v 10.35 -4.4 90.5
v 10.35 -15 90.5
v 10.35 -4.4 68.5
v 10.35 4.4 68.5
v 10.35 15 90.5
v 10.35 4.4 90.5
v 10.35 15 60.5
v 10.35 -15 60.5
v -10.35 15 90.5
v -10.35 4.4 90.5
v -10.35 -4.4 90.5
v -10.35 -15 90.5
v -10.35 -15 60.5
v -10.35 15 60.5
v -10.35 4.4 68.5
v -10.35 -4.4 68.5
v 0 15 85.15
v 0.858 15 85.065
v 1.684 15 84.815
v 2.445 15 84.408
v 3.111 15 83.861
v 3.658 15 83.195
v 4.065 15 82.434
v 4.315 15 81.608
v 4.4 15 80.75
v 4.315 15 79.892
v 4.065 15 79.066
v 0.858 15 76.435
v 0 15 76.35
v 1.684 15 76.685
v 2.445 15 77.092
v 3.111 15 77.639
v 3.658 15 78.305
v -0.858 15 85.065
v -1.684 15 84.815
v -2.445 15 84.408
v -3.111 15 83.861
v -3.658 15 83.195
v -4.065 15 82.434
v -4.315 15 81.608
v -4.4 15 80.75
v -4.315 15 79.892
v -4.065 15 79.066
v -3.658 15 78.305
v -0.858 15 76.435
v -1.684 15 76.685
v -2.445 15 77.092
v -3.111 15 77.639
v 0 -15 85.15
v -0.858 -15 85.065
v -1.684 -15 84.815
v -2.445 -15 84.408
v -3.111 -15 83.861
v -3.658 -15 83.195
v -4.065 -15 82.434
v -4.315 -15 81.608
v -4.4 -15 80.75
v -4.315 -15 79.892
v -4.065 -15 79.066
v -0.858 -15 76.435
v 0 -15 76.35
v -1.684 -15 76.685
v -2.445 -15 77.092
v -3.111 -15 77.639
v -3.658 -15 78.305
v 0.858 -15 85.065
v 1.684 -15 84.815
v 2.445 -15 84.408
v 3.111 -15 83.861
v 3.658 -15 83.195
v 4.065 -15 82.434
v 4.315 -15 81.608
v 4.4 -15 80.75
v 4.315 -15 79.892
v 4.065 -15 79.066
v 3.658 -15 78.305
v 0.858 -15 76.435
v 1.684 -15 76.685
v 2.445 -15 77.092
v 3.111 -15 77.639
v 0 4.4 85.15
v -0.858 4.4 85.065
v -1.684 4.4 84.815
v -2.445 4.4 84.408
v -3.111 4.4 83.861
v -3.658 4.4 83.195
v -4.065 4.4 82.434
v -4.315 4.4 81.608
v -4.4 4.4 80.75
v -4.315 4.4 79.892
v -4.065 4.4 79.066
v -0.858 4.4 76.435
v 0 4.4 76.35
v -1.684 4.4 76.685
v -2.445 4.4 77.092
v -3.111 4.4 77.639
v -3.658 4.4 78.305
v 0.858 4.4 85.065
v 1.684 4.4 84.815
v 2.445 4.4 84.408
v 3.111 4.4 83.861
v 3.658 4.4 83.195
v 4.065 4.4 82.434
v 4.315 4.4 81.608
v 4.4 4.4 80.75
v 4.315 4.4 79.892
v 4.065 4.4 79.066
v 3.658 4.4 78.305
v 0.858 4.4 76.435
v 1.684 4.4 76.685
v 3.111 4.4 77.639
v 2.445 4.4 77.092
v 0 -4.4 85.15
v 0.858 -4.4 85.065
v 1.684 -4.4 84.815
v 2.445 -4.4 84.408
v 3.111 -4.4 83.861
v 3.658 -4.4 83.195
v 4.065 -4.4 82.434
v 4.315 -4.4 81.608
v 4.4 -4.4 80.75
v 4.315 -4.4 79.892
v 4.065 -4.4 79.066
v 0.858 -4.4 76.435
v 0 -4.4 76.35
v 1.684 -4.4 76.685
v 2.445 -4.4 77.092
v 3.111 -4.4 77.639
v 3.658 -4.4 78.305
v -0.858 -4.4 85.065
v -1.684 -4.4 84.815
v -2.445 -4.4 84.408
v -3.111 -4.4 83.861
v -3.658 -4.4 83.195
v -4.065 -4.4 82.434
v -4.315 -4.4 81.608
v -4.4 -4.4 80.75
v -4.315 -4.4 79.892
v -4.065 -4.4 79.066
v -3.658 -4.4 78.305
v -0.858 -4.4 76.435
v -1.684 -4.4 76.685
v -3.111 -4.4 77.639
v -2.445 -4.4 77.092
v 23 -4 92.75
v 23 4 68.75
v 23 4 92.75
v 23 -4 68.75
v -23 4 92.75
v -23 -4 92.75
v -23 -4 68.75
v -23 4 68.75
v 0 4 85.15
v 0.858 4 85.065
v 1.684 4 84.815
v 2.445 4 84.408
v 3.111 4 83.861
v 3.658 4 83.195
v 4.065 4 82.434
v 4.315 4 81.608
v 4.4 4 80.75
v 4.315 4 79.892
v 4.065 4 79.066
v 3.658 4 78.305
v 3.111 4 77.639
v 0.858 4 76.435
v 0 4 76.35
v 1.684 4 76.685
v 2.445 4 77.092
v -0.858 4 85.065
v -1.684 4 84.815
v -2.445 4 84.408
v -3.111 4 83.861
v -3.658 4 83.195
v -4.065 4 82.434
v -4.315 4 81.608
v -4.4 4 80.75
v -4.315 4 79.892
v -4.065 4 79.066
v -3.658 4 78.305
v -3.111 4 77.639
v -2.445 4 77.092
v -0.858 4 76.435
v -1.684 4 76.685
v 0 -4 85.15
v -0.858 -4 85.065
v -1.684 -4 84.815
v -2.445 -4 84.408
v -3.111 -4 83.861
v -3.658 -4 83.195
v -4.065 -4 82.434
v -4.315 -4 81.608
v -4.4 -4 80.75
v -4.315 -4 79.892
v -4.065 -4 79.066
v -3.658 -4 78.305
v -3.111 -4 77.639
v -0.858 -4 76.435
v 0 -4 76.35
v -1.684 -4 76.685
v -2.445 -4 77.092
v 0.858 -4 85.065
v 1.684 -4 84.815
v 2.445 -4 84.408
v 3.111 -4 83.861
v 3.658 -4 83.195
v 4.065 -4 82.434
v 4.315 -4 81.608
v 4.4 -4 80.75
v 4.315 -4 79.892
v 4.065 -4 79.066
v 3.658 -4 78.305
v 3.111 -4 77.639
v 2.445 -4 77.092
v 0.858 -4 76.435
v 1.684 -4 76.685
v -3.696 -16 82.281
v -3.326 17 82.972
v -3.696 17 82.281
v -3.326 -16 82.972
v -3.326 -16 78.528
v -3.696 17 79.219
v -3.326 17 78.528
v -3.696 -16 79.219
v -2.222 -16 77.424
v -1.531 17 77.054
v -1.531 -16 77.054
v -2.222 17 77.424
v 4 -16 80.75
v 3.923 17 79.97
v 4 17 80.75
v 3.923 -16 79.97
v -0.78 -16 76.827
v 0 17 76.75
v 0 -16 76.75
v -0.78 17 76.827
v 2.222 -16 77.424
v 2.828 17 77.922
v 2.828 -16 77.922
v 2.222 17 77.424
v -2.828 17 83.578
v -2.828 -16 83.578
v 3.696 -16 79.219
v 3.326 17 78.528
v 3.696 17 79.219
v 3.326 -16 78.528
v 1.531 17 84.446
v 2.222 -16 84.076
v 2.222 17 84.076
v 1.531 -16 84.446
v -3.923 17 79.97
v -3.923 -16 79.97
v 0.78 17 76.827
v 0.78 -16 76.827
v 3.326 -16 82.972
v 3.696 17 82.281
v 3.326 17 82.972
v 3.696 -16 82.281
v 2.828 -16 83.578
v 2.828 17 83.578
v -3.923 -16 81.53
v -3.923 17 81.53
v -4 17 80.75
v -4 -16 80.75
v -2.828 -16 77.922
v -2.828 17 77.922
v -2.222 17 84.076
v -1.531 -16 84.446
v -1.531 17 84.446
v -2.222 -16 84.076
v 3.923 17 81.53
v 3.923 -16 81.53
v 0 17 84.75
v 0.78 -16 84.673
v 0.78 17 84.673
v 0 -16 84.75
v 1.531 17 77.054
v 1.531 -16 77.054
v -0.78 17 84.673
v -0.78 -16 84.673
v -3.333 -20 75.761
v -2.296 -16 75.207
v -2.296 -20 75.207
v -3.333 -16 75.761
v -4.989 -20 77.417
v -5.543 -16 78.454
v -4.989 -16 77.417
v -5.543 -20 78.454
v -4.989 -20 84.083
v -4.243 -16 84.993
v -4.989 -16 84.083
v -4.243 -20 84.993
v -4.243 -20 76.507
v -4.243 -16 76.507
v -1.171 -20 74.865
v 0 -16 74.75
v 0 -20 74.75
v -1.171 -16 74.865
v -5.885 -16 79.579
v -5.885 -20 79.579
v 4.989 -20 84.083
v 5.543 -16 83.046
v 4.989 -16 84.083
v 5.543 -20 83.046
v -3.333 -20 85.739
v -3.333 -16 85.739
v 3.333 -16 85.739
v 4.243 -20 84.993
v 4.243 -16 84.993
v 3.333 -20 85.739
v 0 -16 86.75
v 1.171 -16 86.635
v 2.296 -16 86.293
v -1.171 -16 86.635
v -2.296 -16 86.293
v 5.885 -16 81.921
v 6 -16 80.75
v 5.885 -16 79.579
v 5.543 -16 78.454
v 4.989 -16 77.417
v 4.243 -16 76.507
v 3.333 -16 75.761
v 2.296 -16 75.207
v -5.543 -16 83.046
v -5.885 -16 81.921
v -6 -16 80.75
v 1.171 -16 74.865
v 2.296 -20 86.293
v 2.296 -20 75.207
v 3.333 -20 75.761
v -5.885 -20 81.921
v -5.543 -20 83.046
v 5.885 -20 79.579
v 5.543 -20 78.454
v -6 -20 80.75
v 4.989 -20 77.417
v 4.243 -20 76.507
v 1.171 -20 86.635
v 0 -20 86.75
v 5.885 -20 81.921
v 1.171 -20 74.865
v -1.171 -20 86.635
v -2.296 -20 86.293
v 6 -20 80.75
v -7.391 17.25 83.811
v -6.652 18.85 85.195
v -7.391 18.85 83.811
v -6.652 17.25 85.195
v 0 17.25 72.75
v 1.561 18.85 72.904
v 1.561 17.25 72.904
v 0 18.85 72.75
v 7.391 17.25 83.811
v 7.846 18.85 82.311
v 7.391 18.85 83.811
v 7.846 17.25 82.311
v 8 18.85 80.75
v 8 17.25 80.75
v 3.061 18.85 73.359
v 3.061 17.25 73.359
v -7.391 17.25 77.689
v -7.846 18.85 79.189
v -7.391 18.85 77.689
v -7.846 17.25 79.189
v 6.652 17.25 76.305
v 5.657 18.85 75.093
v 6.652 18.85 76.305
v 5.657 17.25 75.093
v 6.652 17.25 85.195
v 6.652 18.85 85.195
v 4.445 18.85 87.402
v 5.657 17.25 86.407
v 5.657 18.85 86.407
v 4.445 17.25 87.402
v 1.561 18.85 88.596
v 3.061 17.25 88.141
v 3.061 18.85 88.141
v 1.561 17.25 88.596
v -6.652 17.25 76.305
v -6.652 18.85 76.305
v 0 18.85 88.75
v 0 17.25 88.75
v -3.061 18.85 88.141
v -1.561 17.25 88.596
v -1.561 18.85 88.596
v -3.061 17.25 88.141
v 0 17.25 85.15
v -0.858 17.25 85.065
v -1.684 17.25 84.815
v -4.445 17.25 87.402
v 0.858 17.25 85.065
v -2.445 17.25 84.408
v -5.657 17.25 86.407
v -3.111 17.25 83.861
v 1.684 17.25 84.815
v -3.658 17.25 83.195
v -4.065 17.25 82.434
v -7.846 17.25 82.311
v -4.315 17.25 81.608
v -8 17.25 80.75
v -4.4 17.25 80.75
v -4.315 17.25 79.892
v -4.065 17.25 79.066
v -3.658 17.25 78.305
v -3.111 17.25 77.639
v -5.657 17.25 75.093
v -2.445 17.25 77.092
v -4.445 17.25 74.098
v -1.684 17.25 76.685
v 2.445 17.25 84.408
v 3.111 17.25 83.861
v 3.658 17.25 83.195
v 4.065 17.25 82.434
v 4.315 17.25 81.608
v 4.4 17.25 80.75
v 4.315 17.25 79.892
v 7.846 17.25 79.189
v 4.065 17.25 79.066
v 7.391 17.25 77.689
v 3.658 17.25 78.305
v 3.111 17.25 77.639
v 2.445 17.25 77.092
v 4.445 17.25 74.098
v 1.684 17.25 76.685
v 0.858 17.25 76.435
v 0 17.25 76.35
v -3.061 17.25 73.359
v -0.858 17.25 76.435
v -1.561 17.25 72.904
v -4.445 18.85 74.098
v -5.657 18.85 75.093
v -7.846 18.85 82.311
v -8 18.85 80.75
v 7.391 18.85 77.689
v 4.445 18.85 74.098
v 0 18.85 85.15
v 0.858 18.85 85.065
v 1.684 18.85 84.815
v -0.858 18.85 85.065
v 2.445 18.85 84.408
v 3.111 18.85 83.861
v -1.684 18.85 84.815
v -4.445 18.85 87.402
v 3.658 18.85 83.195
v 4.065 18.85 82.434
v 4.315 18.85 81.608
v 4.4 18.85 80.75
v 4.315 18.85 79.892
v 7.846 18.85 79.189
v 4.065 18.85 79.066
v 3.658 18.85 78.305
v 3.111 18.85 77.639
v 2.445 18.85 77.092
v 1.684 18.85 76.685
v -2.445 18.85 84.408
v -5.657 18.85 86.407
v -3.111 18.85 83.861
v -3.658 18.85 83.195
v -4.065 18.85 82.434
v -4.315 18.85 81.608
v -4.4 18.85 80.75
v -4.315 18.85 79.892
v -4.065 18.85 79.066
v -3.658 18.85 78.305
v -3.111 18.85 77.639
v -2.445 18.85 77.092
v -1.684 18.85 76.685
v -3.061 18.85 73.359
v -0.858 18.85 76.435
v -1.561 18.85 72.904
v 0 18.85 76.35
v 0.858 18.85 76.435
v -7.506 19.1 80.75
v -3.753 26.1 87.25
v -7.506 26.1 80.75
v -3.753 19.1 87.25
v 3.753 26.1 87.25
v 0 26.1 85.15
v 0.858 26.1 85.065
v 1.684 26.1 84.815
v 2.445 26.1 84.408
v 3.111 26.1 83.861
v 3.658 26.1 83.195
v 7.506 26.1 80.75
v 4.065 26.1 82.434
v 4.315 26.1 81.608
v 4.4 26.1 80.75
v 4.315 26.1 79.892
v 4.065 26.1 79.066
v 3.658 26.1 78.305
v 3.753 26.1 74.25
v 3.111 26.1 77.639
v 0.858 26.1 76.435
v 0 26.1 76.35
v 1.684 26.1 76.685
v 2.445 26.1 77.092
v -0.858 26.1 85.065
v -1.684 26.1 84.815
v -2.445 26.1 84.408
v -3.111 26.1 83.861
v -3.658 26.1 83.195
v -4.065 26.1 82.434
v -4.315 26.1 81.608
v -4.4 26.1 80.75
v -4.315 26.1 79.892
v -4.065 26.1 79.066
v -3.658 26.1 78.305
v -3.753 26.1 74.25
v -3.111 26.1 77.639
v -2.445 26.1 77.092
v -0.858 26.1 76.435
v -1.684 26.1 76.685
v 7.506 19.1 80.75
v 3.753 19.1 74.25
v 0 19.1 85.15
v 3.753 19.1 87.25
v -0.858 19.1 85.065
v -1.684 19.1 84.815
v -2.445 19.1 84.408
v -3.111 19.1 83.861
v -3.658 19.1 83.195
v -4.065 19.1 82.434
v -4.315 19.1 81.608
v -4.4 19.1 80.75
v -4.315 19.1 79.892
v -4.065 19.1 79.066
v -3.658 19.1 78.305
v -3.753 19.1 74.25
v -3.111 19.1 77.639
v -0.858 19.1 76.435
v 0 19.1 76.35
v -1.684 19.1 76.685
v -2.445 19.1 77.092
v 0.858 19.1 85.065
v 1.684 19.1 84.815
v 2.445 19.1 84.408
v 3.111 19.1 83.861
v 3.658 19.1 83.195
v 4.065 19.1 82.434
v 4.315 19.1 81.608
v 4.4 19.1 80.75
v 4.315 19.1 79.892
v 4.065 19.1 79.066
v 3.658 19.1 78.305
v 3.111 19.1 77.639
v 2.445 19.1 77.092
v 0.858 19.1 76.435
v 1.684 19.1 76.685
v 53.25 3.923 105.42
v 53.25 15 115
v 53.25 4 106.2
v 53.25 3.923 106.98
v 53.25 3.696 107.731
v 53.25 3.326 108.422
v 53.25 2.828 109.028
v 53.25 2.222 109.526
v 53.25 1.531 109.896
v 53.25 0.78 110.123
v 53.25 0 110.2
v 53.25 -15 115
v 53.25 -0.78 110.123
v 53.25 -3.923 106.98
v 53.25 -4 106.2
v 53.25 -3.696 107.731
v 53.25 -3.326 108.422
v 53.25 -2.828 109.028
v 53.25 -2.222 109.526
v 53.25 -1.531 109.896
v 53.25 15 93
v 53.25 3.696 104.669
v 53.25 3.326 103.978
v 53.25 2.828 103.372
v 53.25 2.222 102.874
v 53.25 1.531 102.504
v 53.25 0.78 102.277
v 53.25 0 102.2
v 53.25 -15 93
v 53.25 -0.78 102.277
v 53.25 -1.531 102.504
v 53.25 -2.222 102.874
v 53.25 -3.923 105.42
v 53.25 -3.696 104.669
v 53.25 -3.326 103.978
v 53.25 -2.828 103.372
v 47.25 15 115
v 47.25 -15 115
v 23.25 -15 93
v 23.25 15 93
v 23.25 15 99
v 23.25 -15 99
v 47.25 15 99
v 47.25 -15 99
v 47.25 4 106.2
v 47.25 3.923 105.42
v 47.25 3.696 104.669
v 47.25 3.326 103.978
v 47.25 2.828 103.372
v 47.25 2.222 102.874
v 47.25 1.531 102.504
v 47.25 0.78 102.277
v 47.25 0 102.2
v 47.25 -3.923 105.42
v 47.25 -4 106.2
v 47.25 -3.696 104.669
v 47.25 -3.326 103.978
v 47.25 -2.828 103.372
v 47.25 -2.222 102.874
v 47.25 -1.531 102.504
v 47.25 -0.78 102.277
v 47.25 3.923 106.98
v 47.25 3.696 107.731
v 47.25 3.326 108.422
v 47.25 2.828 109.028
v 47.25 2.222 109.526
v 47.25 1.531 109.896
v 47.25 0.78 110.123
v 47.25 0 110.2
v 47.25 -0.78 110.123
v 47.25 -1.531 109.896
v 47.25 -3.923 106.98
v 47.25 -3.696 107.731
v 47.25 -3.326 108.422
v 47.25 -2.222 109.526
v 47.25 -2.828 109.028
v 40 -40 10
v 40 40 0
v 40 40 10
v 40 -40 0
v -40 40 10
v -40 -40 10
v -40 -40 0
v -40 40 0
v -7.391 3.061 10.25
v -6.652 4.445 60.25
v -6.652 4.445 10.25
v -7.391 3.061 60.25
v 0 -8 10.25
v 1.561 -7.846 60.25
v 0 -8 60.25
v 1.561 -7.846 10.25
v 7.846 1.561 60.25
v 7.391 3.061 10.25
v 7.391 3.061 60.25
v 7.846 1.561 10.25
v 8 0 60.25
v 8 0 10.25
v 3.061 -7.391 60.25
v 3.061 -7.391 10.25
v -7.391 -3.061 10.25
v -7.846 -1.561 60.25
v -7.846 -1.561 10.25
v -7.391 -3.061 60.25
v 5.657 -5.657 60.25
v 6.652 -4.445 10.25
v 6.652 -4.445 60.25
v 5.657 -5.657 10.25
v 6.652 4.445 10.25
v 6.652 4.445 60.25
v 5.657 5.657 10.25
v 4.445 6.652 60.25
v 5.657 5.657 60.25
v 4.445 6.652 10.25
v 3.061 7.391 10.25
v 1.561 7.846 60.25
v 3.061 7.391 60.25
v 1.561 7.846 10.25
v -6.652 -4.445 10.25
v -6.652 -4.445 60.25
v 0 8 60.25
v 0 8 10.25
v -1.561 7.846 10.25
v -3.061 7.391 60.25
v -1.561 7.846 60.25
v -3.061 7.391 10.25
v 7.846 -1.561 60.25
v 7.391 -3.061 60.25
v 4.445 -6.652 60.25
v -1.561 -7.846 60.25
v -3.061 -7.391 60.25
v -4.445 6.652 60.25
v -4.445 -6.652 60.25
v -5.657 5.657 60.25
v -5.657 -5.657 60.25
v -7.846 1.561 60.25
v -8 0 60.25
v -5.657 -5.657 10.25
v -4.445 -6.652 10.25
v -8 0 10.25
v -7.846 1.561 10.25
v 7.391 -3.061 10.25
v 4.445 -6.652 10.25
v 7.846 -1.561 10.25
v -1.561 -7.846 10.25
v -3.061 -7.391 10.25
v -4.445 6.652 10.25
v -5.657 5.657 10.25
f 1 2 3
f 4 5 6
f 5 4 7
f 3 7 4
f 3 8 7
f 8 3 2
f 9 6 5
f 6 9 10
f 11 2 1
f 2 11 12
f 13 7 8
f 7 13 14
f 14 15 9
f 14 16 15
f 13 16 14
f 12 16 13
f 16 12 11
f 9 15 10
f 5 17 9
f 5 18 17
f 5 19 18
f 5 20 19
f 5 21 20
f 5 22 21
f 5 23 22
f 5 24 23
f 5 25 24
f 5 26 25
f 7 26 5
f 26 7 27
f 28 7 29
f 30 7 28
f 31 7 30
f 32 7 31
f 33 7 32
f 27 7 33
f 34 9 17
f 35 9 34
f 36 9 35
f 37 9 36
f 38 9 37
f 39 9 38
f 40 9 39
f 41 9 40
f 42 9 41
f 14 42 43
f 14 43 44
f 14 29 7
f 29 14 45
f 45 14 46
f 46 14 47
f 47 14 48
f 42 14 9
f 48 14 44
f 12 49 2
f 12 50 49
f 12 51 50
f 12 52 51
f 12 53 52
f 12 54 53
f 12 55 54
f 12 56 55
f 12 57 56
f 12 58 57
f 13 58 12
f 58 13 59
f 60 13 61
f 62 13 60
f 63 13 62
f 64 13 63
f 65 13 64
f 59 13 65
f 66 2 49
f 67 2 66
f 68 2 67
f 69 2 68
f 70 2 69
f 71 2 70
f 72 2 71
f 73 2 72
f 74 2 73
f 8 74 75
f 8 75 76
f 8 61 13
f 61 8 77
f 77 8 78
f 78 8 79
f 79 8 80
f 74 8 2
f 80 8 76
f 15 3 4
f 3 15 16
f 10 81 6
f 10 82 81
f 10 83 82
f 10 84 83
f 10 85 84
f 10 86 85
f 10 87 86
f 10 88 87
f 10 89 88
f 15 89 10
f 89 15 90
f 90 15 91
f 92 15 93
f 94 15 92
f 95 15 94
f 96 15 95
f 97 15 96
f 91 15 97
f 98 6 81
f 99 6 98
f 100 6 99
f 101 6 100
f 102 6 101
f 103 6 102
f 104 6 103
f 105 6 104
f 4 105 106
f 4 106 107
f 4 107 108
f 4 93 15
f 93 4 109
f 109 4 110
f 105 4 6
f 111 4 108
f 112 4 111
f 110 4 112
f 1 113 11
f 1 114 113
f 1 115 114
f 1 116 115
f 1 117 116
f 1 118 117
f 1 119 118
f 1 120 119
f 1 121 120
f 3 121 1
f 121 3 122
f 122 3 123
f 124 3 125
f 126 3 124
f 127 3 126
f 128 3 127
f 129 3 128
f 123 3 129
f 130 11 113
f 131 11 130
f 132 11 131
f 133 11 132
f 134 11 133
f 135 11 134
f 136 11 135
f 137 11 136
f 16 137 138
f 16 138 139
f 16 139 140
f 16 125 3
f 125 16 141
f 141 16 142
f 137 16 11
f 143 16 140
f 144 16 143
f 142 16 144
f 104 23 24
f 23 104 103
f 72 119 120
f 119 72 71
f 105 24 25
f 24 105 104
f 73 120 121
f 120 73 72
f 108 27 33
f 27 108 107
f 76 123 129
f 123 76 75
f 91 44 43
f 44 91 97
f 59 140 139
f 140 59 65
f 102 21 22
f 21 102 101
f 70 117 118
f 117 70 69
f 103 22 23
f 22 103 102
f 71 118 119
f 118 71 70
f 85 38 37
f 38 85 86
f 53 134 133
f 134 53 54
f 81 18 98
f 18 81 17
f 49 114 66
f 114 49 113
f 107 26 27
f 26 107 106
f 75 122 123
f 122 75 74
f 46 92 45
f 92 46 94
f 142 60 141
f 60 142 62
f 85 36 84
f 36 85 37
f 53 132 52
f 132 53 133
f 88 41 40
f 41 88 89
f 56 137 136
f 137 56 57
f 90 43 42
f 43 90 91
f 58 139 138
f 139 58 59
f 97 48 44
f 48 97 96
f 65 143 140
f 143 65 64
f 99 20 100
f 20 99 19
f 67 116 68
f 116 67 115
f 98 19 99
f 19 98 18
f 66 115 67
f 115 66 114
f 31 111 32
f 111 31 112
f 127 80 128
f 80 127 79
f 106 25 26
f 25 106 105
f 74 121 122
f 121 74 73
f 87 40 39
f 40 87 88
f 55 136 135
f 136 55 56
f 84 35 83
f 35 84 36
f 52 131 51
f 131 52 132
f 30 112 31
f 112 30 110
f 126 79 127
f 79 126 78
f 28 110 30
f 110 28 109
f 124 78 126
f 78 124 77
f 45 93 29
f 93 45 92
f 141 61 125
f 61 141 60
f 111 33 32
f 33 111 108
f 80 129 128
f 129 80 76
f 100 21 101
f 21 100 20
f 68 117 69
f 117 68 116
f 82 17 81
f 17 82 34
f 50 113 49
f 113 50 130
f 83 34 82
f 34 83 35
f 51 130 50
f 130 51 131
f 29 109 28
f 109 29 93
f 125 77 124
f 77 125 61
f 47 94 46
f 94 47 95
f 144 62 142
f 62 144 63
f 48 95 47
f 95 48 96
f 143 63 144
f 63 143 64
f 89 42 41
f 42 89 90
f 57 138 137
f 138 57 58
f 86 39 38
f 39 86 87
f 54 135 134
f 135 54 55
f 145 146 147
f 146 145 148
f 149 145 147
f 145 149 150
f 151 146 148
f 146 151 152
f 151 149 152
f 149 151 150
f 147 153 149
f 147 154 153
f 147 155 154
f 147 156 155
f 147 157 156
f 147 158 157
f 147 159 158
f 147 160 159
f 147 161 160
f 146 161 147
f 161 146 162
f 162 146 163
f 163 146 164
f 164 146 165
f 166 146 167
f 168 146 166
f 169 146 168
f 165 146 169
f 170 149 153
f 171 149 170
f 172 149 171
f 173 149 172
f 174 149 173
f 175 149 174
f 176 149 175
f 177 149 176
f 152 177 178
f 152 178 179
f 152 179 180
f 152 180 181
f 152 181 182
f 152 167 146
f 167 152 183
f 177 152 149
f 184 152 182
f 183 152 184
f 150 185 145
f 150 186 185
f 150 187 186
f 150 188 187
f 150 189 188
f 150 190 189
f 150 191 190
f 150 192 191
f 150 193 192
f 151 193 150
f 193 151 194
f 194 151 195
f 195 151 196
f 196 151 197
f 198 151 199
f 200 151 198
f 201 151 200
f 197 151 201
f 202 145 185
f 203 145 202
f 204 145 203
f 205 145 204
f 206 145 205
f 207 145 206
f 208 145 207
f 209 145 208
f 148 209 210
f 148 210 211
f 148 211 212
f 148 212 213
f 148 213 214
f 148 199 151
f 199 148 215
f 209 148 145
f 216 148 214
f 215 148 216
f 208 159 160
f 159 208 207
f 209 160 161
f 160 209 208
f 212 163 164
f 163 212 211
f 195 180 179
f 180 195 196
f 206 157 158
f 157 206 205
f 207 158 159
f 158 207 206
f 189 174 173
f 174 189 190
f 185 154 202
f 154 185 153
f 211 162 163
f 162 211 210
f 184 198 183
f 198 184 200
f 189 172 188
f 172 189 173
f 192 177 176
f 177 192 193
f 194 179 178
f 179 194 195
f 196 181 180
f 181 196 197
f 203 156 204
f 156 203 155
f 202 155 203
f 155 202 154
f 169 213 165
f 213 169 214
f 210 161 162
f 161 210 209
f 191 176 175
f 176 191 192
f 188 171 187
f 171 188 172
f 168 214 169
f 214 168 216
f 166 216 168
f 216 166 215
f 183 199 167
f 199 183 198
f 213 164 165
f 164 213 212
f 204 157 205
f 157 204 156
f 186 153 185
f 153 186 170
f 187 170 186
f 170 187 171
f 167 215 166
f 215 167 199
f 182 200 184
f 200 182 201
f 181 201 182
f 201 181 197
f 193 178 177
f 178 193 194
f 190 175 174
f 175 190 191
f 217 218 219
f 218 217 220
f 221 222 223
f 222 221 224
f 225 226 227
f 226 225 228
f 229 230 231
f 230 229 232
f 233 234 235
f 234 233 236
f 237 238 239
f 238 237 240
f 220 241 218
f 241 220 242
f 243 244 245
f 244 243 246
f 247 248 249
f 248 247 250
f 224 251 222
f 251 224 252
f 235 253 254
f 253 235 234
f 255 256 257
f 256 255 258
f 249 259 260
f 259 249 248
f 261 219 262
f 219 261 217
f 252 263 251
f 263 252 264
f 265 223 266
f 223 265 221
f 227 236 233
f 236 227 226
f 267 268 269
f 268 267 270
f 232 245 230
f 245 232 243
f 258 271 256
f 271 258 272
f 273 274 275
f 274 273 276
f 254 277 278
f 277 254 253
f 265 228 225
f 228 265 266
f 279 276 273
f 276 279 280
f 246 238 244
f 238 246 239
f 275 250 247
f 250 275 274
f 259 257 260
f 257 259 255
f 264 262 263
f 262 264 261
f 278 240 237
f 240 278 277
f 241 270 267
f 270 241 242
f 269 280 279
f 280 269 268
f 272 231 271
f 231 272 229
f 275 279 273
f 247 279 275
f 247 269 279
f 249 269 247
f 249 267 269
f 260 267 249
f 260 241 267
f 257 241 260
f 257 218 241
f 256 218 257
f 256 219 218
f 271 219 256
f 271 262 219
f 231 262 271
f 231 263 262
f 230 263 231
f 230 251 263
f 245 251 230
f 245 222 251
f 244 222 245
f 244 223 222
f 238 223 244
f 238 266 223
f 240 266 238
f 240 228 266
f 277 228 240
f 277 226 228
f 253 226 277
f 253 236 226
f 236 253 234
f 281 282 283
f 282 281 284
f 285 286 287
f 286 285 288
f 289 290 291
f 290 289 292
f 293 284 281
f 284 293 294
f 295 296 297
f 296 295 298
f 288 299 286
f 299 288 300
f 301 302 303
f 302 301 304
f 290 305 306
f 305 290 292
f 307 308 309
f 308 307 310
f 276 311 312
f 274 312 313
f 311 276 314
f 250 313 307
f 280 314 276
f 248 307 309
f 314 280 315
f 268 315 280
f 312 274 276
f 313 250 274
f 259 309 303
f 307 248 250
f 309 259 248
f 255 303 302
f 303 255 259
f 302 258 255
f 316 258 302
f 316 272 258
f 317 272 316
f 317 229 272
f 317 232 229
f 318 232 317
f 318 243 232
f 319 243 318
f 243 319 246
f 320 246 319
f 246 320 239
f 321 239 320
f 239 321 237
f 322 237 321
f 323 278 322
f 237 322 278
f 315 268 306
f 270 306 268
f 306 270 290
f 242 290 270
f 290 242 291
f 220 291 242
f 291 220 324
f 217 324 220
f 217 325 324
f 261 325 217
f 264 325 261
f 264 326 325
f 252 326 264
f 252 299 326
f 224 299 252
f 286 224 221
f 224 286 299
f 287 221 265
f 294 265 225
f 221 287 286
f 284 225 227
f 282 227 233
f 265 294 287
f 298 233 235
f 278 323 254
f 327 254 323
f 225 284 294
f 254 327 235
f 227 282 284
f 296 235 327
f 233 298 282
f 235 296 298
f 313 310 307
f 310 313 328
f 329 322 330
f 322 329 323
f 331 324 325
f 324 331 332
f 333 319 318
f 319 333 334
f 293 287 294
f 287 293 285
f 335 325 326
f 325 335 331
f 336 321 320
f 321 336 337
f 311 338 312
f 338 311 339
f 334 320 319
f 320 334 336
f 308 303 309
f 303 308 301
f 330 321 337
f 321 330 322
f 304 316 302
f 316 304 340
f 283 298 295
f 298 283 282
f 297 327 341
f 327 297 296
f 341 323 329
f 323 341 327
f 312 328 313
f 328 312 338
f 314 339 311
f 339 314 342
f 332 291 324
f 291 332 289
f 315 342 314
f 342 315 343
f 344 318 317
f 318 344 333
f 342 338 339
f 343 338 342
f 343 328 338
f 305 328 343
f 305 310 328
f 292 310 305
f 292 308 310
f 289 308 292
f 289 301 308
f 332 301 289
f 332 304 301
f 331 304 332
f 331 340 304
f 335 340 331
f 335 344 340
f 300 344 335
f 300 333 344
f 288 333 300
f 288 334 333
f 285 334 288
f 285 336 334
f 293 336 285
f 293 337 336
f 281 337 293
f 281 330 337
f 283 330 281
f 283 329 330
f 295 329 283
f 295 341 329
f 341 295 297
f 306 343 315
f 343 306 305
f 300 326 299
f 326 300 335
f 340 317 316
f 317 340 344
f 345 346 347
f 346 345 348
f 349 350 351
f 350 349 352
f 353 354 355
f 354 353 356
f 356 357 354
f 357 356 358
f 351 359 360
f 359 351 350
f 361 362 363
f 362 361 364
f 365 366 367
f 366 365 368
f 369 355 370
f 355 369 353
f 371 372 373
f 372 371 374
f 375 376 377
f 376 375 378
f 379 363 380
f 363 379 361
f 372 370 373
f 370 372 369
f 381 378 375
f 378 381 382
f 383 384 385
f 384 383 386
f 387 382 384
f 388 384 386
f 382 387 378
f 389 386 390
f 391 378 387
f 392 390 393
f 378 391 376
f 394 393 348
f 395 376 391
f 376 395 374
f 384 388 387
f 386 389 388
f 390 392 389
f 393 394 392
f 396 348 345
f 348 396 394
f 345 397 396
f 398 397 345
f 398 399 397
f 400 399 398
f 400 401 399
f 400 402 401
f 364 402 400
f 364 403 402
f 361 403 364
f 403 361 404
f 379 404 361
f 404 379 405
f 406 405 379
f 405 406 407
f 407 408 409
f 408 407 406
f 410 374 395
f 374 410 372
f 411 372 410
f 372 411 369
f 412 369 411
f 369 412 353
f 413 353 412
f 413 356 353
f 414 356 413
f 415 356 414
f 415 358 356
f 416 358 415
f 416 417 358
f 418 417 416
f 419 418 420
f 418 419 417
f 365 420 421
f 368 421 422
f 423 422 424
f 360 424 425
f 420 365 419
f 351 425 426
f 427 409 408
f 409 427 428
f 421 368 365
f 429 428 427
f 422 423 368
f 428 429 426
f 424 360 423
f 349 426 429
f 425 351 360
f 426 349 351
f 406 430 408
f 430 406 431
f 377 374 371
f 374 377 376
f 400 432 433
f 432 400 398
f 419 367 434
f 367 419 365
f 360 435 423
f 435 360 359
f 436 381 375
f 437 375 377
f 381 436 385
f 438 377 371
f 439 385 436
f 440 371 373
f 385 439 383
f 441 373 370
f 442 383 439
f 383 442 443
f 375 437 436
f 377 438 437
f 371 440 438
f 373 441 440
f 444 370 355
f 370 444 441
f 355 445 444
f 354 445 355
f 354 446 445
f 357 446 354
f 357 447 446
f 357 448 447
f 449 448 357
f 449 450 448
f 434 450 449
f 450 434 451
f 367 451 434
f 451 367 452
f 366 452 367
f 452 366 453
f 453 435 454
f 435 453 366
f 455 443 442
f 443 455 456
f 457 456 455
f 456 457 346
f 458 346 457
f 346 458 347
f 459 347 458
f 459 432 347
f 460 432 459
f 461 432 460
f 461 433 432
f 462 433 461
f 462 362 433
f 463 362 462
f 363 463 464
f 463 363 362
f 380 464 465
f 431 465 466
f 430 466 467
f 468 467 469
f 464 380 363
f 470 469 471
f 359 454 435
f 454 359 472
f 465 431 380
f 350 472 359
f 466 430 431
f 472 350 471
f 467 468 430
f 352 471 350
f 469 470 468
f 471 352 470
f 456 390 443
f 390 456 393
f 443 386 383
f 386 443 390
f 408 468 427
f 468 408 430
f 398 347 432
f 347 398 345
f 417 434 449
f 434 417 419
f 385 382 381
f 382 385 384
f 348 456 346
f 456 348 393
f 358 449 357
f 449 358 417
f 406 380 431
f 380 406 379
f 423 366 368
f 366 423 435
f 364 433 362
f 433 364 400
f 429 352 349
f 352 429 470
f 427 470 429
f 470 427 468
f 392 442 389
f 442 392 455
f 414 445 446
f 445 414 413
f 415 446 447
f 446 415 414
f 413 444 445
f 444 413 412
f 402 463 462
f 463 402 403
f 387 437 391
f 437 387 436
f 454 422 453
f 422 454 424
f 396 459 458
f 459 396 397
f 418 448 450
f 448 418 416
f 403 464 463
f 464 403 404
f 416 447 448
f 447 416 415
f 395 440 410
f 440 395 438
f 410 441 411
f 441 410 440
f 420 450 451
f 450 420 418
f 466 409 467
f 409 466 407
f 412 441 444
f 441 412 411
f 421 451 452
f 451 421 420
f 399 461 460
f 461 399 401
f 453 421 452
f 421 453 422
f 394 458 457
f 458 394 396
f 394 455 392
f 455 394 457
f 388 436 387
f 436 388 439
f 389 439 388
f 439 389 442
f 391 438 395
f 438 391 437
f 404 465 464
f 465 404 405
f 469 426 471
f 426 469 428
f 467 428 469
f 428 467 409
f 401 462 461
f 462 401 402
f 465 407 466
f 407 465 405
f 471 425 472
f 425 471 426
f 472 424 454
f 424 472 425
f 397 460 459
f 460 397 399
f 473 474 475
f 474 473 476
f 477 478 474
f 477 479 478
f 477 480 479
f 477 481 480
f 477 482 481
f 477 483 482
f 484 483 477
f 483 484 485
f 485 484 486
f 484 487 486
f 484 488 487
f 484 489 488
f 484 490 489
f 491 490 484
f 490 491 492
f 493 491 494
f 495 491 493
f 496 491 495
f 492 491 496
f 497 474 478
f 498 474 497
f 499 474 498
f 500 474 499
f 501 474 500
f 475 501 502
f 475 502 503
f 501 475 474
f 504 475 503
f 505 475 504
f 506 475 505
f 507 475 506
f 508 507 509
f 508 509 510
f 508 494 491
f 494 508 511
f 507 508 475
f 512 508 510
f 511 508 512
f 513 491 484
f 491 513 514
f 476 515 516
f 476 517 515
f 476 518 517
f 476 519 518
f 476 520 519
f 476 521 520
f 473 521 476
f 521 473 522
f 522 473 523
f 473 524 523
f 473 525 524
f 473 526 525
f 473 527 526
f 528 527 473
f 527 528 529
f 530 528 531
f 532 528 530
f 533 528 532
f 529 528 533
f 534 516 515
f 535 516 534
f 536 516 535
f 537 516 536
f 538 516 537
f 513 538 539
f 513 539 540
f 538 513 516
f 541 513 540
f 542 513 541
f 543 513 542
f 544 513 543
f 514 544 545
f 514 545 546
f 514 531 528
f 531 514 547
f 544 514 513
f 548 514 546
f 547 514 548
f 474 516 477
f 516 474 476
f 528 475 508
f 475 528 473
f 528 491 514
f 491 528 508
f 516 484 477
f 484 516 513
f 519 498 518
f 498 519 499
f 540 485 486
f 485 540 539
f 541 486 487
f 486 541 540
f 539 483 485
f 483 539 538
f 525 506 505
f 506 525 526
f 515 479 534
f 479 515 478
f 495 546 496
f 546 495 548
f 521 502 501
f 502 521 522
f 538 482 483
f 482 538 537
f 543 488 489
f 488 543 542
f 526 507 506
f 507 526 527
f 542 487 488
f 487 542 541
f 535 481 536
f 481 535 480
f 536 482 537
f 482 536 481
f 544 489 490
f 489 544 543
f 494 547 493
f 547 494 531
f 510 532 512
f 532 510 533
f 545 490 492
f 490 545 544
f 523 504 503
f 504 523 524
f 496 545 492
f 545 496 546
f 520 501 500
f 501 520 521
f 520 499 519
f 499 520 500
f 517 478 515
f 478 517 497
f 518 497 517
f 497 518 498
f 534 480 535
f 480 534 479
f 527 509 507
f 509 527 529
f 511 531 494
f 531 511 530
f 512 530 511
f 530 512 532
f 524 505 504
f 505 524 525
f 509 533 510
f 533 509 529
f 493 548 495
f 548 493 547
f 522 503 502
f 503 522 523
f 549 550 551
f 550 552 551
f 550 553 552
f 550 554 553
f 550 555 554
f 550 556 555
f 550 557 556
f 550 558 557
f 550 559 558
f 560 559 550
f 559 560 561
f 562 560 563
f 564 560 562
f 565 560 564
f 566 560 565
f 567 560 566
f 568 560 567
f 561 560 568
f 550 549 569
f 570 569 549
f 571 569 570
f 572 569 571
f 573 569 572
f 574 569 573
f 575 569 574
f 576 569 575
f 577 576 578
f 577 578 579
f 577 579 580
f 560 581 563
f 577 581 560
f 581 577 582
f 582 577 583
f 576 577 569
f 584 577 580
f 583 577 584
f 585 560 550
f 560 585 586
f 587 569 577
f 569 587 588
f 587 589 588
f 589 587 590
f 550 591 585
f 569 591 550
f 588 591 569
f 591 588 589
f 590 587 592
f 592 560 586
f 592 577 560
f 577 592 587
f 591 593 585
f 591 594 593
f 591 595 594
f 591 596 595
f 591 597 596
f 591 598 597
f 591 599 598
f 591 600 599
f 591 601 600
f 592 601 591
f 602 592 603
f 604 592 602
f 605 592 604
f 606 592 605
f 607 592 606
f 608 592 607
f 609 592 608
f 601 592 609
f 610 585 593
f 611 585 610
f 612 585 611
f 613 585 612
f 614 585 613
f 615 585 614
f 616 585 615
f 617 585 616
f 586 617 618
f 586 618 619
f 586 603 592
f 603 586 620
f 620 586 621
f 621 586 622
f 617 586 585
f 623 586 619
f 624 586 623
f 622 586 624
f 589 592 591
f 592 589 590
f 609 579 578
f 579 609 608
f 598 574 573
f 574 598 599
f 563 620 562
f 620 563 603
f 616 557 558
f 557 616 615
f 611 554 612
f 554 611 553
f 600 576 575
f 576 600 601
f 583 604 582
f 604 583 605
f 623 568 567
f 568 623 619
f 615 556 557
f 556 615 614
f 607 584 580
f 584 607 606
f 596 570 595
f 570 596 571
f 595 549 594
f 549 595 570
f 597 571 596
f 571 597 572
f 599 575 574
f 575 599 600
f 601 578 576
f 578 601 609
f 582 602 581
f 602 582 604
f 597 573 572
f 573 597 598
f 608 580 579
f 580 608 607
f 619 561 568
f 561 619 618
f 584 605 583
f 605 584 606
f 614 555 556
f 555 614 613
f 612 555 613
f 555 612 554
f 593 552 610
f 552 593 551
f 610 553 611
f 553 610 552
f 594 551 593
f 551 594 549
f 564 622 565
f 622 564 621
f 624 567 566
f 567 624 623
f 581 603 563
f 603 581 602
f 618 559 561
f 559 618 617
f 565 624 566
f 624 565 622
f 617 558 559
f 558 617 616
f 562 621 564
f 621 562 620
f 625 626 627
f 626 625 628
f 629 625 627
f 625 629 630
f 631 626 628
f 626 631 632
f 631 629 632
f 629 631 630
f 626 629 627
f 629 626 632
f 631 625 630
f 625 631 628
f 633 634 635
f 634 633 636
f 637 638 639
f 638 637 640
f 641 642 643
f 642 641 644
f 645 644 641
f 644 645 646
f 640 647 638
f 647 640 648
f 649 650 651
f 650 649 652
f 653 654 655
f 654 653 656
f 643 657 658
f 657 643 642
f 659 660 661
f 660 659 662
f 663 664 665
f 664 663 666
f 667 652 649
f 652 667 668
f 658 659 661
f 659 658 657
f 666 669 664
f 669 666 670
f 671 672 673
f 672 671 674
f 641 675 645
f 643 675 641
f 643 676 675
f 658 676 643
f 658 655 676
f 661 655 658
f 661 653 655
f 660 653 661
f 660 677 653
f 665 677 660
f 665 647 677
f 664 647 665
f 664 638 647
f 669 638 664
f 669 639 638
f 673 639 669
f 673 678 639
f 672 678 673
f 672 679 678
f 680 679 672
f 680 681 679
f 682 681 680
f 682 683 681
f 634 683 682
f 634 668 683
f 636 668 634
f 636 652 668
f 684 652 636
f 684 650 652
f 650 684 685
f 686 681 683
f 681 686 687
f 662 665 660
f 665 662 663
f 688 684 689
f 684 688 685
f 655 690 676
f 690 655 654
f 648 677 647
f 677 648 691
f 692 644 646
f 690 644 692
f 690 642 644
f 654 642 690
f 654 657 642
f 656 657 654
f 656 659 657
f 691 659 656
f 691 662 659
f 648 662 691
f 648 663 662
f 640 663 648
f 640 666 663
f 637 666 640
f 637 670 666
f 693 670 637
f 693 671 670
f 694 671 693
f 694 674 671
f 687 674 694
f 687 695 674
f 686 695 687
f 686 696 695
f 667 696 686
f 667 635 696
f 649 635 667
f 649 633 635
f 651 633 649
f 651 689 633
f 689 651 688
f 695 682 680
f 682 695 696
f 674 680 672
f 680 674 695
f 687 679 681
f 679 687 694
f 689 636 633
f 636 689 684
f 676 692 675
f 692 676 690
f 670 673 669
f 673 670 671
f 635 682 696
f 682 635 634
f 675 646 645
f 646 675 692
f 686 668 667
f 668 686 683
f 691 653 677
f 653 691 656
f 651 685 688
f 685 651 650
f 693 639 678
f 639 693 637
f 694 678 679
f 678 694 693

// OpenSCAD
$fn = 32;

// ------------------------------------------------------------------------
// Lamp arm: column d16 x 50 mm, arm 46 mm
// Every part is its own module, assembly() places every instance.
// ------------------------------------------------------------------------

// --- part 1 ---
module lamp_base() {
  difference() {
    translate([-40, -40, 0]) cube([80, 80, 10]);
  }
}

// --- part 2 ---
module lamp_column() {
  cylinder(h = 50, d = 16);
}

// --- part 3 ---
module head_fork() {
  difference() {
    translate([-10.35, -15, 0]) cube([20.7, 30, 30]);
    translate([-11.35, -4.4, 8]) cube([22.7, 8.8, 23]);
    translate([0, 0, 20.25]) rotate([90, 0, 0]) cylinder(h = 32, d = 8.8, center = true);
  }
}

// --- part 4 ---
module lamp_arm() {
  difference() {
    translate([-23, -4, 0]) cube([46, 8, 24]);
    translate([0, 0, 12]) rotate([90, 0, 0]) cylinder(h = 10, d = 8.8, center = true);
  }
}

// --- part 5 ---
module arm_pin() {
  rotate([0, 90, 0]) cylinder(h = 34, d = 8, center = true);
  translate([-20, 0, 0]) rotate([0, 90, 0]) cylinder(h = 4, d = 12);
}

// --- part 6 ---
module arm_washer() {
  difference() {
      translate([0, 0, 0]) cylinder(h = 1.6, d = 16);
      translate([0, 0, -1]) cylinder(h = 3.6, d = 8.8);
    }
}

// --- part 7 ---
module arm_nut() {
  difference() {
    linear_extrude(height = 7) polygon(points = [[7.506, 0], [3.753, 6.5], [-3.753, 6.5], [-7.506, 0], [-3.753, -6.5], [3.753, -6.5]]);
    translate([0, 0, -1]) cylinder(h = 9, d = 8.8);
  }
}

// --- part 8 ---
module shade_bracket() {
  difference() {
    translate([-15, -15, 0]) cube([30, 30, 22]);
    translate([-16, -16, 6]) cube([25, 32, 17]);
    translate([12, 0, 13.2]) rotate([0, 90, 0]) cylinder(h = 8, d = 8, center = true);
  }
}

// --- assembly ---
module assembly() {
  color([0.80, 0.24, 0.20]) translate([0, 0, 0]) rotate([0, 0, 0]) lamp_base();
  color([0.20, 0.45, 0.75]) translate([0, 0, 10.25]) rotate([0, 0, 0]) lamp_column();
  color([0.25, 0.62, 0.32]) translate([0, 0, 60.5]) rotate([0, 0, 0]) head_fork();
  color([0.92, 0.70, 0.18]) translate([0, 0, 68.75]) rotate([0, 0, 0]) lamp_arm();
  color([0.58, 0.35, 0.70]) translate([0, 0, 80.75]) rotate([0, 0, 90]) arm_pin();
  color([0.16, 0.66, 0.66]) translate([0, 18.85, 80.75]) rotate([90, 0, 0]) arm_washer();
  color([0.85, 0.48, 0.18]) translate([0, 26.1, 80.75]) rotate([90, 0, 0]) arm_nut();
  color([0.55, 0.60, 0.65]) translate([38.25, 0, 93]) rotate([0, 0, 0]) shade_bracket();
}

assembly();
